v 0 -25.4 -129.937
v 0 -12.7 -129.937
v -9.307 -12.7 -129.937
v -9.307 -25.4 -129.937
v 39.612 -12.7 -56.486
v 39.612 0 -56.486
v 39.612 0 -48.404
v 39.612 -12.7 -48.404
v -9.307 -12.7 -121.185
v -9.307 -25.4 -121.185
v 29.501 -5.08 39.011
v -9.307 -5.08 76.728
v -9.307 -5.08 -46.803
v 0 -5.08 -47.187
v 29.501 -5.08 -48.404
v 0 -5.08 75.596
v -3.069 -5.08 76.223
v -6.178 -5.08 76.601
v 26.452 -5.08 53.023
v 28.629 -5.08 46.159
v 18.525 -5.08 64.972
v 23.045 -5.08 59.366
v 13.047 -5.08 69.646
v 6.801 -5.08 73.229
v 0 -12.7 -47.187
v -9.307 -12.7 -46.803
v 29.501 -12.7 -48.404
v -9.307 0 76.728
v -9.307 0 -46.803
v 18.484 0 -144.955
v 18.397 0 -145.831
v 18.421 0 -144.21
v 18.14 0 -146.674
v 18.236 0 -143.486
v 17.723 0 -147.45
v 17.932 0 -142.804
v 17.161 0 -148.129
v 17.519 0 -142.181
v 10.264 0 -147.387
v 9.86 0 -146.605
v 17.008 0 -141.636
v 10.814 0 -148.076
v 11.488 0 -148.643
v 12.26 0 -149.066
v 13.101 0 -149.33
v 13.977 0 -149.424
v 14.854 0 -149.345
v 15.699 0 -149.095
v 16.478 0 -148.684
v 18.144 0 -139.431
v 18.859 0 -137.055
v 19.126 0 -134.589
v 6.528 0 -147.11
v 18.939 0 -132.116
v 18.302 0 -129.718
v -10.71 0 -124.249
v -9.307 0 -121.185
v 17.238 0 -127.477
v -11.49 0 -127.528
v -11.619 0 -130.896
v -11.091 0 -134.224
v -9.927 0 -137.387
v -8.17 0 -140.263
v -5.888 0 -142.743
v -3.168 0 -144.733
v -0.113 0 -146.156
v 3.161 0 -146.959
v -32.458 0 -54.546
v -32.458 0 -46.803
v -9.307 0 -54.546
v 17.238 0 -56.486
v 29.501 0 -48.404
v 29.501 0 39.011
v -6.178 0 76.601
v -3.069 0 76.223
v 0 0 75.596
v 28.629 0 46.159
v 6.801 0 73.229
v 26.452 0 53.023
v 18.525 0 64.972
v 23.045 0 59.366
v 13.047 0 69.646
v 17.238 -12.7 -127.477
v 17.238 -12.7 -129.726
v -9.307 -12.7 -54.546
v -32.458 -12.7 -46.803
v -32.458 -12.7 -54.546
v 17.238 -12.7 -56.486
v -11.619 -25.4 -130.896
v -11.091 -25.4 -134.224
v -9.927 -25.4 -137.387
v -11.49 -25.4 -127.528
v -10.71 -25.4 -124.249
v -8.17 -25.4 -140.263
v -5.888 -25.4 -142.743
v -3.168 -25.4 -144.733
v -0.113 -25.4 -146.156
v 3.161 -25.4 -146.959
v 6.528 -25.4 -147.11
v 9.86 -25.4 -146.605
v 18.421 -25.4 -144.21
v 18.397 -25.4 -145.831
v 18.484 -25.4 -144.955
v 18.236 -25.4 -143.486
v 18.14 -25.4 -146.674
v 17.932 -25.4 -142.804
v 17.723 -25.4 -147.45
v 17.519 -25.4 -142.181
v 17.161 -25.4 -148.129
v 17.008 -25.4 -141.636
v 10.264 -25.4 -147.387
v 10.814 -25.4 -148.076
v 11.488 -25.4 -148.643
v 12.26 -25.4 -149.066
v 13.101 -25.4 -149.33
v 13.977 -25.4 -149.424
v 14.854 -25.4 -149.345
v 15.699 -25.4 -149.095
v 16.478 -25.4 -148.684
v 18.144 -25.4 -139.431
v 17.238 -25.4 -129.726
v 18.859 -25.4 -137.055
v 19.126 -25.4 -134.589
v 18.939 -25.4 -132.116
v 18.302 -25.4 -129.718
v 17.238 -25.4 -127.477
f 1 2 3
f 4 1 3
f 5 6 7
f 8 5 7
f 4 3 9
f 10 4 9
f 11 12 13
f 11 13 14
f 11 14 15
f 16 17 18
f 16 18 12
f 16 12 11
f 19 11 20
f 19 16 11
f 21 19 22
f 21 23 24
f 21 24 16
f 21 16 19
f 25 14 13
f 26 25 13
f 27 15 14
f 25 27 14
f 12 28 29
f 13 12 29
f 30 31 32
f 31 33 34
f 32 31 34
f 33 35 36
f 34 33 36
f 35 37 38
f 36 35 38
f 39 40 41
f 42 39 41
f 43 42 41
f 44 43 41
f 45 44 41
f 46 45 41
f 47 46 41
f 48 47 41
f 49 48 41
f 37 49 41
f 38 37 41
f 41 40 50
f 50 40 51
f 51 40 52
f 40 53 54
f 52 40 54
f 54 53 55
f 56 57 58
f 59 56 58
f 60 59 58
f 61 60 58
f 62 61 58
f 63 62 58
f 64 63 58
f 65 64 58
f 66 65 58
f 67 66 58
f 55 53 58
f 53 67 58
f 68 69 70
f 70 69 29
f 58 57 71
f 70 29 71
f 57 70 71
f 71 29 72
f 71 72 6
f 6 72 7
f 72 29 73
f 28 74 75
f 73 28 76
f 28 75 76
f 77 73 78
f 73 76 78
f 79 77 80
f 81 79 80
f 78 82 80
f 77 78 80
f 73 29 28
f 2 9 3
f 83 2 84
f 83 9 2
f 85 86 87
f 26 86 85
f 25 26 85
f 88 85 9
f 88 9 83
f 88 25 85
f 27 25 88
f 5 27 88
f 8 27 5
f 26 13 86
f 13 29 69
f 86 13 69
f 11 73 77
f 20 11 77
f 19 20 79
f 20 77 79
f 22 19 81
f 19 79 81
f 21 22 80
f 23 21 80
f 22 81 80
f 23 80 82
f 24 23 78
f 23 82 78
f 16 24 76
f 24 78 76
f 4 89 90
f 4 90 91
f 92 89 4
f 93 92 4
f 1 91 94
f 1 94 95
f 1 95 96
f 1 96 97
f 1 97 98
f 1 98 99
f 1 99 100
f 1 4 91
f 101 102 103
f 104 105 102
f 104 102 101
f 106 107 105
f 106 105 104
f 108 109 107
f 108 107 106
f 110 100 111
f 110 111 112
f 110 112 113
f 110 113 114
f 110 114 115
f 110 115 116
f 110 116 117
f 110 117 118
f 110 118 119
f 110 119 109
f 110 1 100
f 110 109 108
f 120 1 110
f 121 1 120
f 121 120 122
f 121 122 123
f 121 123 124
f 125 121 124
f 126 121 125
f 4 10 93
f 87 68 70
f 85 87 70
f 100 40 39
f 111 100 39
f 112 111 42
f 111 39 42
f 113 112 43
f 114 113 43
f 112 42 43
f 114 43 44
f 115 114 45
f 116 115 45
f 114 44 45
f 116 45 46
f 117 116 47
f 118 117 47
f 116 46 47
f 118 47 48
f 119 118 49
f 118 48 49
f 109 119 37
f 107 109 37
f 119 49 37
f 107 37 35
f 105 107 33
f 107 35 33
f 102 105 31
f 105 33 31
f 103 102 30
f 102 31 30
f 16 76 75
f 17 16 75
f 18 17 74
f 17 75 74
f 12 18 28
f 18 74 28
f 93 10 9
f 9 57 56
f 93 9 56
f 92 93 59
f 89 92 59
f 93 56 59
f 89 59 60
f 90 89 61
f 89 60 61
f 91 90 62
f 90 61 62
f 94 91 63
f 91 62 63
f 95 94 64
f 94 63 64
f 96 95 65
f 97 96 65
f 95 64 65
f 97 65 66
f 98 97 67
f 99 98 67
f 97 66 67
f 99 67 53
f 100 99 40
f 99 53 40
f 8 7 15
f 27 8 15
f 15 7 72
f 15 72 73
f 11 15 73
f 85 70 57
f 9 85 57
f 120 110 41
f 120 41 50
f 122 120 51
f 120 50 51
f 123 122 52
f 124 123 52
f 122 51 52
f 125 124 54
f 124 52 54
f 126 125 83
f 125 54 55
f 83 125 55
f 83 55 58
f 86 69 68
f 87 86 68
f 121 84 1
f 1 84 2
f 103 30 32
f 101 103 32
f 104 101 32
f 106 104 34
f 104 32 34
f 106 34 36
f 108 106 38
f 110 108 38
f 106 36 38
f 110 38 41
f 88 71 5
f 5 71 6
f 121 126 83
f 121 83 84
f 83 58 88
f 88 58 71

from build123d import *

# Parameters (mm, degrees)
F1_DEPTH = 5.08
F2_DEPTH = 12.7
F3_DEPTH = 25.4


with BuildPart() as f1:
    # F0 (on Front) → F1 (new body)
    with BuildSketch(Plane.XZ):
        with BuildLine():
            Line((0, -47.187425), (0, 75.595615))
            ThreePointArc((0, 75.595615), (-4.619314, 76.443648), (-9.307228, 76.727711))
            Line((-9.307228, 76.727711), (-9.307228, 37.903182))
            Line((-9.307228, 37.903182), (-9.307228, -46.803496))
            Line((-9.307228, -46.803496), (0, -47.187425))
        make_face()
        with BuildLine():
            ThreePointArc((29.501495, 39.010878), (20.91523, 62.274211), (0, 75.595615))
            Line((0, 75.595615), (0, -47.187425))
            Line((0, -47.187425), (29.501495, -48.404383))
            Line((29.501495, -48.404383), (29.501495, -27.950756))
            Line((29.501495, -27.950756), (29.501495, 0))
            Line((29.501495, 0), (29.501495, 39.010878))
        make_face()
    extrude(amount=F1_DEPTH)

    # F0 (on Front) → F2 (join)
    with BuildSketch(Plane.XZ):
        Polygon((29.501495, -48.404383), (0, -47.187425), (-9.307228, -46.803496), (-32.457575, -46.803496), (-32.457575, -54.546013), (-9.307228, -54.546013), (-9.307228, -121.184757), (-9.307228, -129.937008), (0, -129.937008), (17.238326, -129.725629), (17.238326, -127.477206), (17.238326, -79.020567), (17.238326, -56.486391), (29.501495, -56.486391), (39.612059, -56.486391), (39.612059, -48.404383), align=None)
    extrude(amount=F2_DEPTH)

    # F0 (on Front) → F3 (join)
    with BuildSketch(Plane.XZ):
        with BuildLine():
            Line((-9.307228, -129.937008), (-9.307228, -121.184757))
            ThreePointArc((-9.307228, -121.184757), (-8.169823, -140.263142), (9.859656, -146.604776))
            ThreePointArc((9.859656, -146.604776), (11.990386, -145.914729), (14.013868, -144.954681))
            ThreePointArc((14.013868, -144.954681), (15.649123, -143.419867), (17.007979, -141.635709))
            ThreePointArc((17.007979, -141.635709), (19.126457, -134.58905), (17.238326, -127.477206))
            Line((17.238326, -127.477206), (17.238326, -129.725629))
            Line((17.238326, -129.725629), (0, -129.937008))
            Line((0, -129.937008), (-9.307228, -129.937008))
        make_face()
        with BuildLine():
            ThreePointArc((14.013868, -144.954681), (11.990386, -145.914729), (9.859656, -146.604776))
            ThreePointArc((9.859656, -146.604776), (14.853881, -149.344973), (18.483799, -144.954681))
            ThreePointArc((18.483799, -144.954681), (18.098213, -143.13853), (17.007979, -141.635709))
            ThreePointArc((17.007979, -141.635709), (15.649123, -143.419867), (14.013868, -144.954681))
        make_face()
    extrude(amount=F3_DEPTH)


solid = f1.part
